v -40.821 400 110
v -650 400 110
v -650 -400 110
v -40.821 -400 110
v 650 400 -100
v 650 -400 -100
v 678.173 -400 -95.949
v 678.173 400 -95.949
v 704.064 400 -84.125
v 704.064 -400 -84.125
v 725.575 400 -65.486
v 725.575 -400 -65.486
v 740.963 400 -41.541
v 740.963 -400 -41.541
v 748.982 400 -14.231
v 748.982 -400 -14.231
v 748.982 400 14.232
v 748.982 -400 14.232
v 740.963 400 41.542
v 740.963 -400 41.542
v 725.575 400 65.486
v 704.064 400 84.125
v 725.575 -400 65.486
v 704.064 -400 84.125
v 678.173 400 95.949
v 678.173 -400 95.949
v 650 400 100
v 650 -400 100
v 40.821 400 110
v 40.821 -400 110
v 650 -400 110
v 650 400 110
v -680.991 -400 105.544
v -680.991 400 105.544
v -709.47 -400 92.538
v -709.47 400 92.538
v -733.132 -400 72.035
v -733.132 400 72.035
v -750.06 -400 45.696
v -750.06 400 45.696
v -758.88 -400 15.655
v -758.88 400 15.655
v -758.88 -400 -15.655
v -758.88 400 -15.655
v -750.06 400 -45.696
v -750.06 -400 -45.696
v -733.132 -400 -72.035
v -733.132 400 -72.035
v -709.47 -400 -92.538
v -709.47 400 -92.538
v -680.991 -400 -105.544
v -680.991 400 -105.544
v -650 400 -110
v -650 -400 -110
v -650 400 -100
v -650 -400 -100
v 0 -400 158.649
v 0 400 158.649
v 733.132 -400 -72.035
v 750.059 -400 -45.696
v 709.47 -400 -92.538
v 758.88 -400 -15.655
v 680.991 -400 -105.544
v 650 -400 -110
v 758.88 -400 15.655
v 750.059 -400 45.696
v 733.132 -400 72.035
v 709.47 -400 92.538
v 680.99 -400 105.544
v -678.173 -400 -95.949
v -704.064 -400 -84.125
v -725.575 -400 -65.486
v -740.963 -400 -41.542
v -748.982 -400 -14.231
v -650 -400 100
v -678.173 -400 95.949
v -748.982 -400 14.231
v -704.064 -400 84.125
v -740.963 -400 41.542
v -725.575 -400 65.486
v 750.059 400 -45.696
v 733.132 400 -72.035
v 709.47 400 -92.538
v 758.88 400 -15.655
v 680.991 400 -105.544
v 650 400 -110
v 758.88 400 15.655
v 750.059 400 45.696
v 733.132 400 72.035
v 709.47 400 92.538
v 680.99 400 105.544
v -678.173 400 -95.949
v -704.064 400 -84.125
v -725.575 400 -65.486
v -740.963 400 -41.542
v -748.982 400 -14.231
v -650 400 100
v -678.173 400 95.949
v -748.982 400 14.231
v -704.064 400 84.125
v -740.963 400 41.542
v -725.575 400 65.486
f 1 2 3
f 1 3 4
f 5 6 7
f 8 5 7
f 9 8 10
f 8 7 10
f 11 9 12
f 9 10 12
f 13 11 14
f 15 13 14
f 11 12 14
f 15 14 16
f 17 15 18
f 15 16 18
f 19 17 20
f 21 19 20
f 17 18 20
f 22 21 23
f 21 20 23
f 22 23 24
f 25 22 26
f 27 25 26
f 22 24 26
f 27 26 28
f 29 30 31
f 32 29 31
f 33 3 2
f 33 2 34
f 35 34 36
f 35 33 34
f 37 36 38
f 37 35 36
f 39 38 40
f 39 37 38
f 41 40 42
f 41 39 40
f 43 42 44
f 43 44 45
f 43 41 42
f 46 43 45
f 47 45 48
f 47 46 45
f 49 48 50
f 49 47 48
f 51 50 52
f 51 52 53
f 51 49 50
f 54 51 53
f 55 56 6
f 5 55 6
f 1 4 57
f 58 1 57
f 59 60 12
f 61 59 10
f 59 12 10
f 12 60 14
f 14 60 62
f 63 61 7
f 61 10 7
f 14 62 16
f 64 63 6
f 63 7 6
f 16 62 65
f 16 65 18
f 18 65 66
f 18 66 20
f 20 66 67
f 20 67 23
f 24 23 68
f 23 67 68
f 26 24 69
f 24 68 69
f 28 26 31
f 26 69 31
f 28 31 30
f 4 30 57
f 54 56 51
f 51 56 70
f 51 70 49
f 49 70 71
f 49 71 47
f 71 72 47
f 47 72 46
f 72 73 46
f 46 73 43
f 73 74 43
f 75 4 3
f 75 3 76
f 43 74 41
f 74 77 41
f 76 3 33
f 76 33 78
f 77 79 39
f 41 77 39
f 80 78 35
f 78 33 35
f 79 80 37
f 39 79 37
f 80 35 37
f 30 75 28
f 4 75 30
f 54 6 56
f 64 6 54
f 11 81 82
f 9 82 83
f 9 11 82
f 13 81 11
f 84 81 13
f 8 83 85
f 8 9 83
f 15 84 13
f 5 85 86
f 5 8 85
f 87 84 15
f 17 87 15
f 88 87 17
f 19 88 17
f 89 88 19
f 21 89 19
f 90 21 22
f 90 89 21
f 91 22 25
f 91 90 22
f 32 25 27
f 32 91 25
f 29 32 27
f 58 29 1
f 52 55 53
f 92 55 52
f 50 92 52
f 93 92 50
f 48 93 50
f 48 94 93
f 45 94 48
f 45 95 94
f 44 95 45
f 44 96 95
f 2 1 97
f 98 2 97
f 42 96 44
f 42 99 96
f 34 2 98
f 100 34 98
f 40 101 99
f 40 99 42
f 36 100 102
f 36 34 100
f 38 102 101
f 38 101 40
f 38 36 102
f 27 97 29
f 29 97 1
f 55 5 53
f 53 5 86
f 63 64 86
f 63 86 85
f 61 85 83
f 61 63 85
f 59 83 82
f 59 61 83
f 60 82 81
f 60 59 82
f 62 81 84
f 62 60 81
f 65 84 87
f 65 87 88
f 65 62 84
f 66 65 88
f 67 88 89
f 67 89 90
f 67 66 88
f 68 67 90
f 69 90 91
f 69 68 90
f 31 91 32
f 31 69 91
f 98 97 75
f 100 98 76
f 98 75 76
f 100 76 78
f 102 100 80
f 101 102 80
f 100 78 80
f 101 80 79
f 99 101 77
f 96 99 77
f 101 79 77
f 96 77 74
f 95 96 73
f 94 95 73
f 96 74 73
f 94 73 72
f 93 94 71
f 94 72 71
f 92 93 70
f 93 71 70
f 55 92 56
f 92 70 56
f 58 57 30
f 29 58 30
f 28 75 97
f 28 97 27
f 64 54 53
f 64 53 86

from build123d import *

# Parameters (mm, degrees)
PAD_DEPTH = 800


with BuildPart() as part:
    # Sketch → Pad (new body)
    with BuildSketch(Plane.XZ.offset(400)):
        with BuildLine():
            Line((-650.000001, 110), (-40.820946, 110))
            Line((-40.820946, 110), (0, 158.648546))
            Line((0, 158.648546), (40.820946, 110))
            Line((40.820946, 110), (649.999873, 110))
            ThreePointArc((649.999954, -110), (759.999874, 4.1e-05), (649.999873, 110))
            Line((-649.999998, -110), (649.999954, -110))
            ThreePointArc((-650.000001, 110), (-760.000001, -2e-06), (-649.999998, -110))
        make_face()
        with BuildLine():
            Line((-649.999999, 100), (649.999875, 100))
            ThreePointArc((650, -100), (749.999874, 6.3e-05), (649.999875, 100))
            Line((-650, -100), (650, -100))
            ThreePointArc((-649.999999, 100), (-750.000001, 1e-06), (-650, -100))
        make_face(mode=Mode.SUBTRACT)
    extrude(amount=-PAD_DEPTH)


solid = part.part
